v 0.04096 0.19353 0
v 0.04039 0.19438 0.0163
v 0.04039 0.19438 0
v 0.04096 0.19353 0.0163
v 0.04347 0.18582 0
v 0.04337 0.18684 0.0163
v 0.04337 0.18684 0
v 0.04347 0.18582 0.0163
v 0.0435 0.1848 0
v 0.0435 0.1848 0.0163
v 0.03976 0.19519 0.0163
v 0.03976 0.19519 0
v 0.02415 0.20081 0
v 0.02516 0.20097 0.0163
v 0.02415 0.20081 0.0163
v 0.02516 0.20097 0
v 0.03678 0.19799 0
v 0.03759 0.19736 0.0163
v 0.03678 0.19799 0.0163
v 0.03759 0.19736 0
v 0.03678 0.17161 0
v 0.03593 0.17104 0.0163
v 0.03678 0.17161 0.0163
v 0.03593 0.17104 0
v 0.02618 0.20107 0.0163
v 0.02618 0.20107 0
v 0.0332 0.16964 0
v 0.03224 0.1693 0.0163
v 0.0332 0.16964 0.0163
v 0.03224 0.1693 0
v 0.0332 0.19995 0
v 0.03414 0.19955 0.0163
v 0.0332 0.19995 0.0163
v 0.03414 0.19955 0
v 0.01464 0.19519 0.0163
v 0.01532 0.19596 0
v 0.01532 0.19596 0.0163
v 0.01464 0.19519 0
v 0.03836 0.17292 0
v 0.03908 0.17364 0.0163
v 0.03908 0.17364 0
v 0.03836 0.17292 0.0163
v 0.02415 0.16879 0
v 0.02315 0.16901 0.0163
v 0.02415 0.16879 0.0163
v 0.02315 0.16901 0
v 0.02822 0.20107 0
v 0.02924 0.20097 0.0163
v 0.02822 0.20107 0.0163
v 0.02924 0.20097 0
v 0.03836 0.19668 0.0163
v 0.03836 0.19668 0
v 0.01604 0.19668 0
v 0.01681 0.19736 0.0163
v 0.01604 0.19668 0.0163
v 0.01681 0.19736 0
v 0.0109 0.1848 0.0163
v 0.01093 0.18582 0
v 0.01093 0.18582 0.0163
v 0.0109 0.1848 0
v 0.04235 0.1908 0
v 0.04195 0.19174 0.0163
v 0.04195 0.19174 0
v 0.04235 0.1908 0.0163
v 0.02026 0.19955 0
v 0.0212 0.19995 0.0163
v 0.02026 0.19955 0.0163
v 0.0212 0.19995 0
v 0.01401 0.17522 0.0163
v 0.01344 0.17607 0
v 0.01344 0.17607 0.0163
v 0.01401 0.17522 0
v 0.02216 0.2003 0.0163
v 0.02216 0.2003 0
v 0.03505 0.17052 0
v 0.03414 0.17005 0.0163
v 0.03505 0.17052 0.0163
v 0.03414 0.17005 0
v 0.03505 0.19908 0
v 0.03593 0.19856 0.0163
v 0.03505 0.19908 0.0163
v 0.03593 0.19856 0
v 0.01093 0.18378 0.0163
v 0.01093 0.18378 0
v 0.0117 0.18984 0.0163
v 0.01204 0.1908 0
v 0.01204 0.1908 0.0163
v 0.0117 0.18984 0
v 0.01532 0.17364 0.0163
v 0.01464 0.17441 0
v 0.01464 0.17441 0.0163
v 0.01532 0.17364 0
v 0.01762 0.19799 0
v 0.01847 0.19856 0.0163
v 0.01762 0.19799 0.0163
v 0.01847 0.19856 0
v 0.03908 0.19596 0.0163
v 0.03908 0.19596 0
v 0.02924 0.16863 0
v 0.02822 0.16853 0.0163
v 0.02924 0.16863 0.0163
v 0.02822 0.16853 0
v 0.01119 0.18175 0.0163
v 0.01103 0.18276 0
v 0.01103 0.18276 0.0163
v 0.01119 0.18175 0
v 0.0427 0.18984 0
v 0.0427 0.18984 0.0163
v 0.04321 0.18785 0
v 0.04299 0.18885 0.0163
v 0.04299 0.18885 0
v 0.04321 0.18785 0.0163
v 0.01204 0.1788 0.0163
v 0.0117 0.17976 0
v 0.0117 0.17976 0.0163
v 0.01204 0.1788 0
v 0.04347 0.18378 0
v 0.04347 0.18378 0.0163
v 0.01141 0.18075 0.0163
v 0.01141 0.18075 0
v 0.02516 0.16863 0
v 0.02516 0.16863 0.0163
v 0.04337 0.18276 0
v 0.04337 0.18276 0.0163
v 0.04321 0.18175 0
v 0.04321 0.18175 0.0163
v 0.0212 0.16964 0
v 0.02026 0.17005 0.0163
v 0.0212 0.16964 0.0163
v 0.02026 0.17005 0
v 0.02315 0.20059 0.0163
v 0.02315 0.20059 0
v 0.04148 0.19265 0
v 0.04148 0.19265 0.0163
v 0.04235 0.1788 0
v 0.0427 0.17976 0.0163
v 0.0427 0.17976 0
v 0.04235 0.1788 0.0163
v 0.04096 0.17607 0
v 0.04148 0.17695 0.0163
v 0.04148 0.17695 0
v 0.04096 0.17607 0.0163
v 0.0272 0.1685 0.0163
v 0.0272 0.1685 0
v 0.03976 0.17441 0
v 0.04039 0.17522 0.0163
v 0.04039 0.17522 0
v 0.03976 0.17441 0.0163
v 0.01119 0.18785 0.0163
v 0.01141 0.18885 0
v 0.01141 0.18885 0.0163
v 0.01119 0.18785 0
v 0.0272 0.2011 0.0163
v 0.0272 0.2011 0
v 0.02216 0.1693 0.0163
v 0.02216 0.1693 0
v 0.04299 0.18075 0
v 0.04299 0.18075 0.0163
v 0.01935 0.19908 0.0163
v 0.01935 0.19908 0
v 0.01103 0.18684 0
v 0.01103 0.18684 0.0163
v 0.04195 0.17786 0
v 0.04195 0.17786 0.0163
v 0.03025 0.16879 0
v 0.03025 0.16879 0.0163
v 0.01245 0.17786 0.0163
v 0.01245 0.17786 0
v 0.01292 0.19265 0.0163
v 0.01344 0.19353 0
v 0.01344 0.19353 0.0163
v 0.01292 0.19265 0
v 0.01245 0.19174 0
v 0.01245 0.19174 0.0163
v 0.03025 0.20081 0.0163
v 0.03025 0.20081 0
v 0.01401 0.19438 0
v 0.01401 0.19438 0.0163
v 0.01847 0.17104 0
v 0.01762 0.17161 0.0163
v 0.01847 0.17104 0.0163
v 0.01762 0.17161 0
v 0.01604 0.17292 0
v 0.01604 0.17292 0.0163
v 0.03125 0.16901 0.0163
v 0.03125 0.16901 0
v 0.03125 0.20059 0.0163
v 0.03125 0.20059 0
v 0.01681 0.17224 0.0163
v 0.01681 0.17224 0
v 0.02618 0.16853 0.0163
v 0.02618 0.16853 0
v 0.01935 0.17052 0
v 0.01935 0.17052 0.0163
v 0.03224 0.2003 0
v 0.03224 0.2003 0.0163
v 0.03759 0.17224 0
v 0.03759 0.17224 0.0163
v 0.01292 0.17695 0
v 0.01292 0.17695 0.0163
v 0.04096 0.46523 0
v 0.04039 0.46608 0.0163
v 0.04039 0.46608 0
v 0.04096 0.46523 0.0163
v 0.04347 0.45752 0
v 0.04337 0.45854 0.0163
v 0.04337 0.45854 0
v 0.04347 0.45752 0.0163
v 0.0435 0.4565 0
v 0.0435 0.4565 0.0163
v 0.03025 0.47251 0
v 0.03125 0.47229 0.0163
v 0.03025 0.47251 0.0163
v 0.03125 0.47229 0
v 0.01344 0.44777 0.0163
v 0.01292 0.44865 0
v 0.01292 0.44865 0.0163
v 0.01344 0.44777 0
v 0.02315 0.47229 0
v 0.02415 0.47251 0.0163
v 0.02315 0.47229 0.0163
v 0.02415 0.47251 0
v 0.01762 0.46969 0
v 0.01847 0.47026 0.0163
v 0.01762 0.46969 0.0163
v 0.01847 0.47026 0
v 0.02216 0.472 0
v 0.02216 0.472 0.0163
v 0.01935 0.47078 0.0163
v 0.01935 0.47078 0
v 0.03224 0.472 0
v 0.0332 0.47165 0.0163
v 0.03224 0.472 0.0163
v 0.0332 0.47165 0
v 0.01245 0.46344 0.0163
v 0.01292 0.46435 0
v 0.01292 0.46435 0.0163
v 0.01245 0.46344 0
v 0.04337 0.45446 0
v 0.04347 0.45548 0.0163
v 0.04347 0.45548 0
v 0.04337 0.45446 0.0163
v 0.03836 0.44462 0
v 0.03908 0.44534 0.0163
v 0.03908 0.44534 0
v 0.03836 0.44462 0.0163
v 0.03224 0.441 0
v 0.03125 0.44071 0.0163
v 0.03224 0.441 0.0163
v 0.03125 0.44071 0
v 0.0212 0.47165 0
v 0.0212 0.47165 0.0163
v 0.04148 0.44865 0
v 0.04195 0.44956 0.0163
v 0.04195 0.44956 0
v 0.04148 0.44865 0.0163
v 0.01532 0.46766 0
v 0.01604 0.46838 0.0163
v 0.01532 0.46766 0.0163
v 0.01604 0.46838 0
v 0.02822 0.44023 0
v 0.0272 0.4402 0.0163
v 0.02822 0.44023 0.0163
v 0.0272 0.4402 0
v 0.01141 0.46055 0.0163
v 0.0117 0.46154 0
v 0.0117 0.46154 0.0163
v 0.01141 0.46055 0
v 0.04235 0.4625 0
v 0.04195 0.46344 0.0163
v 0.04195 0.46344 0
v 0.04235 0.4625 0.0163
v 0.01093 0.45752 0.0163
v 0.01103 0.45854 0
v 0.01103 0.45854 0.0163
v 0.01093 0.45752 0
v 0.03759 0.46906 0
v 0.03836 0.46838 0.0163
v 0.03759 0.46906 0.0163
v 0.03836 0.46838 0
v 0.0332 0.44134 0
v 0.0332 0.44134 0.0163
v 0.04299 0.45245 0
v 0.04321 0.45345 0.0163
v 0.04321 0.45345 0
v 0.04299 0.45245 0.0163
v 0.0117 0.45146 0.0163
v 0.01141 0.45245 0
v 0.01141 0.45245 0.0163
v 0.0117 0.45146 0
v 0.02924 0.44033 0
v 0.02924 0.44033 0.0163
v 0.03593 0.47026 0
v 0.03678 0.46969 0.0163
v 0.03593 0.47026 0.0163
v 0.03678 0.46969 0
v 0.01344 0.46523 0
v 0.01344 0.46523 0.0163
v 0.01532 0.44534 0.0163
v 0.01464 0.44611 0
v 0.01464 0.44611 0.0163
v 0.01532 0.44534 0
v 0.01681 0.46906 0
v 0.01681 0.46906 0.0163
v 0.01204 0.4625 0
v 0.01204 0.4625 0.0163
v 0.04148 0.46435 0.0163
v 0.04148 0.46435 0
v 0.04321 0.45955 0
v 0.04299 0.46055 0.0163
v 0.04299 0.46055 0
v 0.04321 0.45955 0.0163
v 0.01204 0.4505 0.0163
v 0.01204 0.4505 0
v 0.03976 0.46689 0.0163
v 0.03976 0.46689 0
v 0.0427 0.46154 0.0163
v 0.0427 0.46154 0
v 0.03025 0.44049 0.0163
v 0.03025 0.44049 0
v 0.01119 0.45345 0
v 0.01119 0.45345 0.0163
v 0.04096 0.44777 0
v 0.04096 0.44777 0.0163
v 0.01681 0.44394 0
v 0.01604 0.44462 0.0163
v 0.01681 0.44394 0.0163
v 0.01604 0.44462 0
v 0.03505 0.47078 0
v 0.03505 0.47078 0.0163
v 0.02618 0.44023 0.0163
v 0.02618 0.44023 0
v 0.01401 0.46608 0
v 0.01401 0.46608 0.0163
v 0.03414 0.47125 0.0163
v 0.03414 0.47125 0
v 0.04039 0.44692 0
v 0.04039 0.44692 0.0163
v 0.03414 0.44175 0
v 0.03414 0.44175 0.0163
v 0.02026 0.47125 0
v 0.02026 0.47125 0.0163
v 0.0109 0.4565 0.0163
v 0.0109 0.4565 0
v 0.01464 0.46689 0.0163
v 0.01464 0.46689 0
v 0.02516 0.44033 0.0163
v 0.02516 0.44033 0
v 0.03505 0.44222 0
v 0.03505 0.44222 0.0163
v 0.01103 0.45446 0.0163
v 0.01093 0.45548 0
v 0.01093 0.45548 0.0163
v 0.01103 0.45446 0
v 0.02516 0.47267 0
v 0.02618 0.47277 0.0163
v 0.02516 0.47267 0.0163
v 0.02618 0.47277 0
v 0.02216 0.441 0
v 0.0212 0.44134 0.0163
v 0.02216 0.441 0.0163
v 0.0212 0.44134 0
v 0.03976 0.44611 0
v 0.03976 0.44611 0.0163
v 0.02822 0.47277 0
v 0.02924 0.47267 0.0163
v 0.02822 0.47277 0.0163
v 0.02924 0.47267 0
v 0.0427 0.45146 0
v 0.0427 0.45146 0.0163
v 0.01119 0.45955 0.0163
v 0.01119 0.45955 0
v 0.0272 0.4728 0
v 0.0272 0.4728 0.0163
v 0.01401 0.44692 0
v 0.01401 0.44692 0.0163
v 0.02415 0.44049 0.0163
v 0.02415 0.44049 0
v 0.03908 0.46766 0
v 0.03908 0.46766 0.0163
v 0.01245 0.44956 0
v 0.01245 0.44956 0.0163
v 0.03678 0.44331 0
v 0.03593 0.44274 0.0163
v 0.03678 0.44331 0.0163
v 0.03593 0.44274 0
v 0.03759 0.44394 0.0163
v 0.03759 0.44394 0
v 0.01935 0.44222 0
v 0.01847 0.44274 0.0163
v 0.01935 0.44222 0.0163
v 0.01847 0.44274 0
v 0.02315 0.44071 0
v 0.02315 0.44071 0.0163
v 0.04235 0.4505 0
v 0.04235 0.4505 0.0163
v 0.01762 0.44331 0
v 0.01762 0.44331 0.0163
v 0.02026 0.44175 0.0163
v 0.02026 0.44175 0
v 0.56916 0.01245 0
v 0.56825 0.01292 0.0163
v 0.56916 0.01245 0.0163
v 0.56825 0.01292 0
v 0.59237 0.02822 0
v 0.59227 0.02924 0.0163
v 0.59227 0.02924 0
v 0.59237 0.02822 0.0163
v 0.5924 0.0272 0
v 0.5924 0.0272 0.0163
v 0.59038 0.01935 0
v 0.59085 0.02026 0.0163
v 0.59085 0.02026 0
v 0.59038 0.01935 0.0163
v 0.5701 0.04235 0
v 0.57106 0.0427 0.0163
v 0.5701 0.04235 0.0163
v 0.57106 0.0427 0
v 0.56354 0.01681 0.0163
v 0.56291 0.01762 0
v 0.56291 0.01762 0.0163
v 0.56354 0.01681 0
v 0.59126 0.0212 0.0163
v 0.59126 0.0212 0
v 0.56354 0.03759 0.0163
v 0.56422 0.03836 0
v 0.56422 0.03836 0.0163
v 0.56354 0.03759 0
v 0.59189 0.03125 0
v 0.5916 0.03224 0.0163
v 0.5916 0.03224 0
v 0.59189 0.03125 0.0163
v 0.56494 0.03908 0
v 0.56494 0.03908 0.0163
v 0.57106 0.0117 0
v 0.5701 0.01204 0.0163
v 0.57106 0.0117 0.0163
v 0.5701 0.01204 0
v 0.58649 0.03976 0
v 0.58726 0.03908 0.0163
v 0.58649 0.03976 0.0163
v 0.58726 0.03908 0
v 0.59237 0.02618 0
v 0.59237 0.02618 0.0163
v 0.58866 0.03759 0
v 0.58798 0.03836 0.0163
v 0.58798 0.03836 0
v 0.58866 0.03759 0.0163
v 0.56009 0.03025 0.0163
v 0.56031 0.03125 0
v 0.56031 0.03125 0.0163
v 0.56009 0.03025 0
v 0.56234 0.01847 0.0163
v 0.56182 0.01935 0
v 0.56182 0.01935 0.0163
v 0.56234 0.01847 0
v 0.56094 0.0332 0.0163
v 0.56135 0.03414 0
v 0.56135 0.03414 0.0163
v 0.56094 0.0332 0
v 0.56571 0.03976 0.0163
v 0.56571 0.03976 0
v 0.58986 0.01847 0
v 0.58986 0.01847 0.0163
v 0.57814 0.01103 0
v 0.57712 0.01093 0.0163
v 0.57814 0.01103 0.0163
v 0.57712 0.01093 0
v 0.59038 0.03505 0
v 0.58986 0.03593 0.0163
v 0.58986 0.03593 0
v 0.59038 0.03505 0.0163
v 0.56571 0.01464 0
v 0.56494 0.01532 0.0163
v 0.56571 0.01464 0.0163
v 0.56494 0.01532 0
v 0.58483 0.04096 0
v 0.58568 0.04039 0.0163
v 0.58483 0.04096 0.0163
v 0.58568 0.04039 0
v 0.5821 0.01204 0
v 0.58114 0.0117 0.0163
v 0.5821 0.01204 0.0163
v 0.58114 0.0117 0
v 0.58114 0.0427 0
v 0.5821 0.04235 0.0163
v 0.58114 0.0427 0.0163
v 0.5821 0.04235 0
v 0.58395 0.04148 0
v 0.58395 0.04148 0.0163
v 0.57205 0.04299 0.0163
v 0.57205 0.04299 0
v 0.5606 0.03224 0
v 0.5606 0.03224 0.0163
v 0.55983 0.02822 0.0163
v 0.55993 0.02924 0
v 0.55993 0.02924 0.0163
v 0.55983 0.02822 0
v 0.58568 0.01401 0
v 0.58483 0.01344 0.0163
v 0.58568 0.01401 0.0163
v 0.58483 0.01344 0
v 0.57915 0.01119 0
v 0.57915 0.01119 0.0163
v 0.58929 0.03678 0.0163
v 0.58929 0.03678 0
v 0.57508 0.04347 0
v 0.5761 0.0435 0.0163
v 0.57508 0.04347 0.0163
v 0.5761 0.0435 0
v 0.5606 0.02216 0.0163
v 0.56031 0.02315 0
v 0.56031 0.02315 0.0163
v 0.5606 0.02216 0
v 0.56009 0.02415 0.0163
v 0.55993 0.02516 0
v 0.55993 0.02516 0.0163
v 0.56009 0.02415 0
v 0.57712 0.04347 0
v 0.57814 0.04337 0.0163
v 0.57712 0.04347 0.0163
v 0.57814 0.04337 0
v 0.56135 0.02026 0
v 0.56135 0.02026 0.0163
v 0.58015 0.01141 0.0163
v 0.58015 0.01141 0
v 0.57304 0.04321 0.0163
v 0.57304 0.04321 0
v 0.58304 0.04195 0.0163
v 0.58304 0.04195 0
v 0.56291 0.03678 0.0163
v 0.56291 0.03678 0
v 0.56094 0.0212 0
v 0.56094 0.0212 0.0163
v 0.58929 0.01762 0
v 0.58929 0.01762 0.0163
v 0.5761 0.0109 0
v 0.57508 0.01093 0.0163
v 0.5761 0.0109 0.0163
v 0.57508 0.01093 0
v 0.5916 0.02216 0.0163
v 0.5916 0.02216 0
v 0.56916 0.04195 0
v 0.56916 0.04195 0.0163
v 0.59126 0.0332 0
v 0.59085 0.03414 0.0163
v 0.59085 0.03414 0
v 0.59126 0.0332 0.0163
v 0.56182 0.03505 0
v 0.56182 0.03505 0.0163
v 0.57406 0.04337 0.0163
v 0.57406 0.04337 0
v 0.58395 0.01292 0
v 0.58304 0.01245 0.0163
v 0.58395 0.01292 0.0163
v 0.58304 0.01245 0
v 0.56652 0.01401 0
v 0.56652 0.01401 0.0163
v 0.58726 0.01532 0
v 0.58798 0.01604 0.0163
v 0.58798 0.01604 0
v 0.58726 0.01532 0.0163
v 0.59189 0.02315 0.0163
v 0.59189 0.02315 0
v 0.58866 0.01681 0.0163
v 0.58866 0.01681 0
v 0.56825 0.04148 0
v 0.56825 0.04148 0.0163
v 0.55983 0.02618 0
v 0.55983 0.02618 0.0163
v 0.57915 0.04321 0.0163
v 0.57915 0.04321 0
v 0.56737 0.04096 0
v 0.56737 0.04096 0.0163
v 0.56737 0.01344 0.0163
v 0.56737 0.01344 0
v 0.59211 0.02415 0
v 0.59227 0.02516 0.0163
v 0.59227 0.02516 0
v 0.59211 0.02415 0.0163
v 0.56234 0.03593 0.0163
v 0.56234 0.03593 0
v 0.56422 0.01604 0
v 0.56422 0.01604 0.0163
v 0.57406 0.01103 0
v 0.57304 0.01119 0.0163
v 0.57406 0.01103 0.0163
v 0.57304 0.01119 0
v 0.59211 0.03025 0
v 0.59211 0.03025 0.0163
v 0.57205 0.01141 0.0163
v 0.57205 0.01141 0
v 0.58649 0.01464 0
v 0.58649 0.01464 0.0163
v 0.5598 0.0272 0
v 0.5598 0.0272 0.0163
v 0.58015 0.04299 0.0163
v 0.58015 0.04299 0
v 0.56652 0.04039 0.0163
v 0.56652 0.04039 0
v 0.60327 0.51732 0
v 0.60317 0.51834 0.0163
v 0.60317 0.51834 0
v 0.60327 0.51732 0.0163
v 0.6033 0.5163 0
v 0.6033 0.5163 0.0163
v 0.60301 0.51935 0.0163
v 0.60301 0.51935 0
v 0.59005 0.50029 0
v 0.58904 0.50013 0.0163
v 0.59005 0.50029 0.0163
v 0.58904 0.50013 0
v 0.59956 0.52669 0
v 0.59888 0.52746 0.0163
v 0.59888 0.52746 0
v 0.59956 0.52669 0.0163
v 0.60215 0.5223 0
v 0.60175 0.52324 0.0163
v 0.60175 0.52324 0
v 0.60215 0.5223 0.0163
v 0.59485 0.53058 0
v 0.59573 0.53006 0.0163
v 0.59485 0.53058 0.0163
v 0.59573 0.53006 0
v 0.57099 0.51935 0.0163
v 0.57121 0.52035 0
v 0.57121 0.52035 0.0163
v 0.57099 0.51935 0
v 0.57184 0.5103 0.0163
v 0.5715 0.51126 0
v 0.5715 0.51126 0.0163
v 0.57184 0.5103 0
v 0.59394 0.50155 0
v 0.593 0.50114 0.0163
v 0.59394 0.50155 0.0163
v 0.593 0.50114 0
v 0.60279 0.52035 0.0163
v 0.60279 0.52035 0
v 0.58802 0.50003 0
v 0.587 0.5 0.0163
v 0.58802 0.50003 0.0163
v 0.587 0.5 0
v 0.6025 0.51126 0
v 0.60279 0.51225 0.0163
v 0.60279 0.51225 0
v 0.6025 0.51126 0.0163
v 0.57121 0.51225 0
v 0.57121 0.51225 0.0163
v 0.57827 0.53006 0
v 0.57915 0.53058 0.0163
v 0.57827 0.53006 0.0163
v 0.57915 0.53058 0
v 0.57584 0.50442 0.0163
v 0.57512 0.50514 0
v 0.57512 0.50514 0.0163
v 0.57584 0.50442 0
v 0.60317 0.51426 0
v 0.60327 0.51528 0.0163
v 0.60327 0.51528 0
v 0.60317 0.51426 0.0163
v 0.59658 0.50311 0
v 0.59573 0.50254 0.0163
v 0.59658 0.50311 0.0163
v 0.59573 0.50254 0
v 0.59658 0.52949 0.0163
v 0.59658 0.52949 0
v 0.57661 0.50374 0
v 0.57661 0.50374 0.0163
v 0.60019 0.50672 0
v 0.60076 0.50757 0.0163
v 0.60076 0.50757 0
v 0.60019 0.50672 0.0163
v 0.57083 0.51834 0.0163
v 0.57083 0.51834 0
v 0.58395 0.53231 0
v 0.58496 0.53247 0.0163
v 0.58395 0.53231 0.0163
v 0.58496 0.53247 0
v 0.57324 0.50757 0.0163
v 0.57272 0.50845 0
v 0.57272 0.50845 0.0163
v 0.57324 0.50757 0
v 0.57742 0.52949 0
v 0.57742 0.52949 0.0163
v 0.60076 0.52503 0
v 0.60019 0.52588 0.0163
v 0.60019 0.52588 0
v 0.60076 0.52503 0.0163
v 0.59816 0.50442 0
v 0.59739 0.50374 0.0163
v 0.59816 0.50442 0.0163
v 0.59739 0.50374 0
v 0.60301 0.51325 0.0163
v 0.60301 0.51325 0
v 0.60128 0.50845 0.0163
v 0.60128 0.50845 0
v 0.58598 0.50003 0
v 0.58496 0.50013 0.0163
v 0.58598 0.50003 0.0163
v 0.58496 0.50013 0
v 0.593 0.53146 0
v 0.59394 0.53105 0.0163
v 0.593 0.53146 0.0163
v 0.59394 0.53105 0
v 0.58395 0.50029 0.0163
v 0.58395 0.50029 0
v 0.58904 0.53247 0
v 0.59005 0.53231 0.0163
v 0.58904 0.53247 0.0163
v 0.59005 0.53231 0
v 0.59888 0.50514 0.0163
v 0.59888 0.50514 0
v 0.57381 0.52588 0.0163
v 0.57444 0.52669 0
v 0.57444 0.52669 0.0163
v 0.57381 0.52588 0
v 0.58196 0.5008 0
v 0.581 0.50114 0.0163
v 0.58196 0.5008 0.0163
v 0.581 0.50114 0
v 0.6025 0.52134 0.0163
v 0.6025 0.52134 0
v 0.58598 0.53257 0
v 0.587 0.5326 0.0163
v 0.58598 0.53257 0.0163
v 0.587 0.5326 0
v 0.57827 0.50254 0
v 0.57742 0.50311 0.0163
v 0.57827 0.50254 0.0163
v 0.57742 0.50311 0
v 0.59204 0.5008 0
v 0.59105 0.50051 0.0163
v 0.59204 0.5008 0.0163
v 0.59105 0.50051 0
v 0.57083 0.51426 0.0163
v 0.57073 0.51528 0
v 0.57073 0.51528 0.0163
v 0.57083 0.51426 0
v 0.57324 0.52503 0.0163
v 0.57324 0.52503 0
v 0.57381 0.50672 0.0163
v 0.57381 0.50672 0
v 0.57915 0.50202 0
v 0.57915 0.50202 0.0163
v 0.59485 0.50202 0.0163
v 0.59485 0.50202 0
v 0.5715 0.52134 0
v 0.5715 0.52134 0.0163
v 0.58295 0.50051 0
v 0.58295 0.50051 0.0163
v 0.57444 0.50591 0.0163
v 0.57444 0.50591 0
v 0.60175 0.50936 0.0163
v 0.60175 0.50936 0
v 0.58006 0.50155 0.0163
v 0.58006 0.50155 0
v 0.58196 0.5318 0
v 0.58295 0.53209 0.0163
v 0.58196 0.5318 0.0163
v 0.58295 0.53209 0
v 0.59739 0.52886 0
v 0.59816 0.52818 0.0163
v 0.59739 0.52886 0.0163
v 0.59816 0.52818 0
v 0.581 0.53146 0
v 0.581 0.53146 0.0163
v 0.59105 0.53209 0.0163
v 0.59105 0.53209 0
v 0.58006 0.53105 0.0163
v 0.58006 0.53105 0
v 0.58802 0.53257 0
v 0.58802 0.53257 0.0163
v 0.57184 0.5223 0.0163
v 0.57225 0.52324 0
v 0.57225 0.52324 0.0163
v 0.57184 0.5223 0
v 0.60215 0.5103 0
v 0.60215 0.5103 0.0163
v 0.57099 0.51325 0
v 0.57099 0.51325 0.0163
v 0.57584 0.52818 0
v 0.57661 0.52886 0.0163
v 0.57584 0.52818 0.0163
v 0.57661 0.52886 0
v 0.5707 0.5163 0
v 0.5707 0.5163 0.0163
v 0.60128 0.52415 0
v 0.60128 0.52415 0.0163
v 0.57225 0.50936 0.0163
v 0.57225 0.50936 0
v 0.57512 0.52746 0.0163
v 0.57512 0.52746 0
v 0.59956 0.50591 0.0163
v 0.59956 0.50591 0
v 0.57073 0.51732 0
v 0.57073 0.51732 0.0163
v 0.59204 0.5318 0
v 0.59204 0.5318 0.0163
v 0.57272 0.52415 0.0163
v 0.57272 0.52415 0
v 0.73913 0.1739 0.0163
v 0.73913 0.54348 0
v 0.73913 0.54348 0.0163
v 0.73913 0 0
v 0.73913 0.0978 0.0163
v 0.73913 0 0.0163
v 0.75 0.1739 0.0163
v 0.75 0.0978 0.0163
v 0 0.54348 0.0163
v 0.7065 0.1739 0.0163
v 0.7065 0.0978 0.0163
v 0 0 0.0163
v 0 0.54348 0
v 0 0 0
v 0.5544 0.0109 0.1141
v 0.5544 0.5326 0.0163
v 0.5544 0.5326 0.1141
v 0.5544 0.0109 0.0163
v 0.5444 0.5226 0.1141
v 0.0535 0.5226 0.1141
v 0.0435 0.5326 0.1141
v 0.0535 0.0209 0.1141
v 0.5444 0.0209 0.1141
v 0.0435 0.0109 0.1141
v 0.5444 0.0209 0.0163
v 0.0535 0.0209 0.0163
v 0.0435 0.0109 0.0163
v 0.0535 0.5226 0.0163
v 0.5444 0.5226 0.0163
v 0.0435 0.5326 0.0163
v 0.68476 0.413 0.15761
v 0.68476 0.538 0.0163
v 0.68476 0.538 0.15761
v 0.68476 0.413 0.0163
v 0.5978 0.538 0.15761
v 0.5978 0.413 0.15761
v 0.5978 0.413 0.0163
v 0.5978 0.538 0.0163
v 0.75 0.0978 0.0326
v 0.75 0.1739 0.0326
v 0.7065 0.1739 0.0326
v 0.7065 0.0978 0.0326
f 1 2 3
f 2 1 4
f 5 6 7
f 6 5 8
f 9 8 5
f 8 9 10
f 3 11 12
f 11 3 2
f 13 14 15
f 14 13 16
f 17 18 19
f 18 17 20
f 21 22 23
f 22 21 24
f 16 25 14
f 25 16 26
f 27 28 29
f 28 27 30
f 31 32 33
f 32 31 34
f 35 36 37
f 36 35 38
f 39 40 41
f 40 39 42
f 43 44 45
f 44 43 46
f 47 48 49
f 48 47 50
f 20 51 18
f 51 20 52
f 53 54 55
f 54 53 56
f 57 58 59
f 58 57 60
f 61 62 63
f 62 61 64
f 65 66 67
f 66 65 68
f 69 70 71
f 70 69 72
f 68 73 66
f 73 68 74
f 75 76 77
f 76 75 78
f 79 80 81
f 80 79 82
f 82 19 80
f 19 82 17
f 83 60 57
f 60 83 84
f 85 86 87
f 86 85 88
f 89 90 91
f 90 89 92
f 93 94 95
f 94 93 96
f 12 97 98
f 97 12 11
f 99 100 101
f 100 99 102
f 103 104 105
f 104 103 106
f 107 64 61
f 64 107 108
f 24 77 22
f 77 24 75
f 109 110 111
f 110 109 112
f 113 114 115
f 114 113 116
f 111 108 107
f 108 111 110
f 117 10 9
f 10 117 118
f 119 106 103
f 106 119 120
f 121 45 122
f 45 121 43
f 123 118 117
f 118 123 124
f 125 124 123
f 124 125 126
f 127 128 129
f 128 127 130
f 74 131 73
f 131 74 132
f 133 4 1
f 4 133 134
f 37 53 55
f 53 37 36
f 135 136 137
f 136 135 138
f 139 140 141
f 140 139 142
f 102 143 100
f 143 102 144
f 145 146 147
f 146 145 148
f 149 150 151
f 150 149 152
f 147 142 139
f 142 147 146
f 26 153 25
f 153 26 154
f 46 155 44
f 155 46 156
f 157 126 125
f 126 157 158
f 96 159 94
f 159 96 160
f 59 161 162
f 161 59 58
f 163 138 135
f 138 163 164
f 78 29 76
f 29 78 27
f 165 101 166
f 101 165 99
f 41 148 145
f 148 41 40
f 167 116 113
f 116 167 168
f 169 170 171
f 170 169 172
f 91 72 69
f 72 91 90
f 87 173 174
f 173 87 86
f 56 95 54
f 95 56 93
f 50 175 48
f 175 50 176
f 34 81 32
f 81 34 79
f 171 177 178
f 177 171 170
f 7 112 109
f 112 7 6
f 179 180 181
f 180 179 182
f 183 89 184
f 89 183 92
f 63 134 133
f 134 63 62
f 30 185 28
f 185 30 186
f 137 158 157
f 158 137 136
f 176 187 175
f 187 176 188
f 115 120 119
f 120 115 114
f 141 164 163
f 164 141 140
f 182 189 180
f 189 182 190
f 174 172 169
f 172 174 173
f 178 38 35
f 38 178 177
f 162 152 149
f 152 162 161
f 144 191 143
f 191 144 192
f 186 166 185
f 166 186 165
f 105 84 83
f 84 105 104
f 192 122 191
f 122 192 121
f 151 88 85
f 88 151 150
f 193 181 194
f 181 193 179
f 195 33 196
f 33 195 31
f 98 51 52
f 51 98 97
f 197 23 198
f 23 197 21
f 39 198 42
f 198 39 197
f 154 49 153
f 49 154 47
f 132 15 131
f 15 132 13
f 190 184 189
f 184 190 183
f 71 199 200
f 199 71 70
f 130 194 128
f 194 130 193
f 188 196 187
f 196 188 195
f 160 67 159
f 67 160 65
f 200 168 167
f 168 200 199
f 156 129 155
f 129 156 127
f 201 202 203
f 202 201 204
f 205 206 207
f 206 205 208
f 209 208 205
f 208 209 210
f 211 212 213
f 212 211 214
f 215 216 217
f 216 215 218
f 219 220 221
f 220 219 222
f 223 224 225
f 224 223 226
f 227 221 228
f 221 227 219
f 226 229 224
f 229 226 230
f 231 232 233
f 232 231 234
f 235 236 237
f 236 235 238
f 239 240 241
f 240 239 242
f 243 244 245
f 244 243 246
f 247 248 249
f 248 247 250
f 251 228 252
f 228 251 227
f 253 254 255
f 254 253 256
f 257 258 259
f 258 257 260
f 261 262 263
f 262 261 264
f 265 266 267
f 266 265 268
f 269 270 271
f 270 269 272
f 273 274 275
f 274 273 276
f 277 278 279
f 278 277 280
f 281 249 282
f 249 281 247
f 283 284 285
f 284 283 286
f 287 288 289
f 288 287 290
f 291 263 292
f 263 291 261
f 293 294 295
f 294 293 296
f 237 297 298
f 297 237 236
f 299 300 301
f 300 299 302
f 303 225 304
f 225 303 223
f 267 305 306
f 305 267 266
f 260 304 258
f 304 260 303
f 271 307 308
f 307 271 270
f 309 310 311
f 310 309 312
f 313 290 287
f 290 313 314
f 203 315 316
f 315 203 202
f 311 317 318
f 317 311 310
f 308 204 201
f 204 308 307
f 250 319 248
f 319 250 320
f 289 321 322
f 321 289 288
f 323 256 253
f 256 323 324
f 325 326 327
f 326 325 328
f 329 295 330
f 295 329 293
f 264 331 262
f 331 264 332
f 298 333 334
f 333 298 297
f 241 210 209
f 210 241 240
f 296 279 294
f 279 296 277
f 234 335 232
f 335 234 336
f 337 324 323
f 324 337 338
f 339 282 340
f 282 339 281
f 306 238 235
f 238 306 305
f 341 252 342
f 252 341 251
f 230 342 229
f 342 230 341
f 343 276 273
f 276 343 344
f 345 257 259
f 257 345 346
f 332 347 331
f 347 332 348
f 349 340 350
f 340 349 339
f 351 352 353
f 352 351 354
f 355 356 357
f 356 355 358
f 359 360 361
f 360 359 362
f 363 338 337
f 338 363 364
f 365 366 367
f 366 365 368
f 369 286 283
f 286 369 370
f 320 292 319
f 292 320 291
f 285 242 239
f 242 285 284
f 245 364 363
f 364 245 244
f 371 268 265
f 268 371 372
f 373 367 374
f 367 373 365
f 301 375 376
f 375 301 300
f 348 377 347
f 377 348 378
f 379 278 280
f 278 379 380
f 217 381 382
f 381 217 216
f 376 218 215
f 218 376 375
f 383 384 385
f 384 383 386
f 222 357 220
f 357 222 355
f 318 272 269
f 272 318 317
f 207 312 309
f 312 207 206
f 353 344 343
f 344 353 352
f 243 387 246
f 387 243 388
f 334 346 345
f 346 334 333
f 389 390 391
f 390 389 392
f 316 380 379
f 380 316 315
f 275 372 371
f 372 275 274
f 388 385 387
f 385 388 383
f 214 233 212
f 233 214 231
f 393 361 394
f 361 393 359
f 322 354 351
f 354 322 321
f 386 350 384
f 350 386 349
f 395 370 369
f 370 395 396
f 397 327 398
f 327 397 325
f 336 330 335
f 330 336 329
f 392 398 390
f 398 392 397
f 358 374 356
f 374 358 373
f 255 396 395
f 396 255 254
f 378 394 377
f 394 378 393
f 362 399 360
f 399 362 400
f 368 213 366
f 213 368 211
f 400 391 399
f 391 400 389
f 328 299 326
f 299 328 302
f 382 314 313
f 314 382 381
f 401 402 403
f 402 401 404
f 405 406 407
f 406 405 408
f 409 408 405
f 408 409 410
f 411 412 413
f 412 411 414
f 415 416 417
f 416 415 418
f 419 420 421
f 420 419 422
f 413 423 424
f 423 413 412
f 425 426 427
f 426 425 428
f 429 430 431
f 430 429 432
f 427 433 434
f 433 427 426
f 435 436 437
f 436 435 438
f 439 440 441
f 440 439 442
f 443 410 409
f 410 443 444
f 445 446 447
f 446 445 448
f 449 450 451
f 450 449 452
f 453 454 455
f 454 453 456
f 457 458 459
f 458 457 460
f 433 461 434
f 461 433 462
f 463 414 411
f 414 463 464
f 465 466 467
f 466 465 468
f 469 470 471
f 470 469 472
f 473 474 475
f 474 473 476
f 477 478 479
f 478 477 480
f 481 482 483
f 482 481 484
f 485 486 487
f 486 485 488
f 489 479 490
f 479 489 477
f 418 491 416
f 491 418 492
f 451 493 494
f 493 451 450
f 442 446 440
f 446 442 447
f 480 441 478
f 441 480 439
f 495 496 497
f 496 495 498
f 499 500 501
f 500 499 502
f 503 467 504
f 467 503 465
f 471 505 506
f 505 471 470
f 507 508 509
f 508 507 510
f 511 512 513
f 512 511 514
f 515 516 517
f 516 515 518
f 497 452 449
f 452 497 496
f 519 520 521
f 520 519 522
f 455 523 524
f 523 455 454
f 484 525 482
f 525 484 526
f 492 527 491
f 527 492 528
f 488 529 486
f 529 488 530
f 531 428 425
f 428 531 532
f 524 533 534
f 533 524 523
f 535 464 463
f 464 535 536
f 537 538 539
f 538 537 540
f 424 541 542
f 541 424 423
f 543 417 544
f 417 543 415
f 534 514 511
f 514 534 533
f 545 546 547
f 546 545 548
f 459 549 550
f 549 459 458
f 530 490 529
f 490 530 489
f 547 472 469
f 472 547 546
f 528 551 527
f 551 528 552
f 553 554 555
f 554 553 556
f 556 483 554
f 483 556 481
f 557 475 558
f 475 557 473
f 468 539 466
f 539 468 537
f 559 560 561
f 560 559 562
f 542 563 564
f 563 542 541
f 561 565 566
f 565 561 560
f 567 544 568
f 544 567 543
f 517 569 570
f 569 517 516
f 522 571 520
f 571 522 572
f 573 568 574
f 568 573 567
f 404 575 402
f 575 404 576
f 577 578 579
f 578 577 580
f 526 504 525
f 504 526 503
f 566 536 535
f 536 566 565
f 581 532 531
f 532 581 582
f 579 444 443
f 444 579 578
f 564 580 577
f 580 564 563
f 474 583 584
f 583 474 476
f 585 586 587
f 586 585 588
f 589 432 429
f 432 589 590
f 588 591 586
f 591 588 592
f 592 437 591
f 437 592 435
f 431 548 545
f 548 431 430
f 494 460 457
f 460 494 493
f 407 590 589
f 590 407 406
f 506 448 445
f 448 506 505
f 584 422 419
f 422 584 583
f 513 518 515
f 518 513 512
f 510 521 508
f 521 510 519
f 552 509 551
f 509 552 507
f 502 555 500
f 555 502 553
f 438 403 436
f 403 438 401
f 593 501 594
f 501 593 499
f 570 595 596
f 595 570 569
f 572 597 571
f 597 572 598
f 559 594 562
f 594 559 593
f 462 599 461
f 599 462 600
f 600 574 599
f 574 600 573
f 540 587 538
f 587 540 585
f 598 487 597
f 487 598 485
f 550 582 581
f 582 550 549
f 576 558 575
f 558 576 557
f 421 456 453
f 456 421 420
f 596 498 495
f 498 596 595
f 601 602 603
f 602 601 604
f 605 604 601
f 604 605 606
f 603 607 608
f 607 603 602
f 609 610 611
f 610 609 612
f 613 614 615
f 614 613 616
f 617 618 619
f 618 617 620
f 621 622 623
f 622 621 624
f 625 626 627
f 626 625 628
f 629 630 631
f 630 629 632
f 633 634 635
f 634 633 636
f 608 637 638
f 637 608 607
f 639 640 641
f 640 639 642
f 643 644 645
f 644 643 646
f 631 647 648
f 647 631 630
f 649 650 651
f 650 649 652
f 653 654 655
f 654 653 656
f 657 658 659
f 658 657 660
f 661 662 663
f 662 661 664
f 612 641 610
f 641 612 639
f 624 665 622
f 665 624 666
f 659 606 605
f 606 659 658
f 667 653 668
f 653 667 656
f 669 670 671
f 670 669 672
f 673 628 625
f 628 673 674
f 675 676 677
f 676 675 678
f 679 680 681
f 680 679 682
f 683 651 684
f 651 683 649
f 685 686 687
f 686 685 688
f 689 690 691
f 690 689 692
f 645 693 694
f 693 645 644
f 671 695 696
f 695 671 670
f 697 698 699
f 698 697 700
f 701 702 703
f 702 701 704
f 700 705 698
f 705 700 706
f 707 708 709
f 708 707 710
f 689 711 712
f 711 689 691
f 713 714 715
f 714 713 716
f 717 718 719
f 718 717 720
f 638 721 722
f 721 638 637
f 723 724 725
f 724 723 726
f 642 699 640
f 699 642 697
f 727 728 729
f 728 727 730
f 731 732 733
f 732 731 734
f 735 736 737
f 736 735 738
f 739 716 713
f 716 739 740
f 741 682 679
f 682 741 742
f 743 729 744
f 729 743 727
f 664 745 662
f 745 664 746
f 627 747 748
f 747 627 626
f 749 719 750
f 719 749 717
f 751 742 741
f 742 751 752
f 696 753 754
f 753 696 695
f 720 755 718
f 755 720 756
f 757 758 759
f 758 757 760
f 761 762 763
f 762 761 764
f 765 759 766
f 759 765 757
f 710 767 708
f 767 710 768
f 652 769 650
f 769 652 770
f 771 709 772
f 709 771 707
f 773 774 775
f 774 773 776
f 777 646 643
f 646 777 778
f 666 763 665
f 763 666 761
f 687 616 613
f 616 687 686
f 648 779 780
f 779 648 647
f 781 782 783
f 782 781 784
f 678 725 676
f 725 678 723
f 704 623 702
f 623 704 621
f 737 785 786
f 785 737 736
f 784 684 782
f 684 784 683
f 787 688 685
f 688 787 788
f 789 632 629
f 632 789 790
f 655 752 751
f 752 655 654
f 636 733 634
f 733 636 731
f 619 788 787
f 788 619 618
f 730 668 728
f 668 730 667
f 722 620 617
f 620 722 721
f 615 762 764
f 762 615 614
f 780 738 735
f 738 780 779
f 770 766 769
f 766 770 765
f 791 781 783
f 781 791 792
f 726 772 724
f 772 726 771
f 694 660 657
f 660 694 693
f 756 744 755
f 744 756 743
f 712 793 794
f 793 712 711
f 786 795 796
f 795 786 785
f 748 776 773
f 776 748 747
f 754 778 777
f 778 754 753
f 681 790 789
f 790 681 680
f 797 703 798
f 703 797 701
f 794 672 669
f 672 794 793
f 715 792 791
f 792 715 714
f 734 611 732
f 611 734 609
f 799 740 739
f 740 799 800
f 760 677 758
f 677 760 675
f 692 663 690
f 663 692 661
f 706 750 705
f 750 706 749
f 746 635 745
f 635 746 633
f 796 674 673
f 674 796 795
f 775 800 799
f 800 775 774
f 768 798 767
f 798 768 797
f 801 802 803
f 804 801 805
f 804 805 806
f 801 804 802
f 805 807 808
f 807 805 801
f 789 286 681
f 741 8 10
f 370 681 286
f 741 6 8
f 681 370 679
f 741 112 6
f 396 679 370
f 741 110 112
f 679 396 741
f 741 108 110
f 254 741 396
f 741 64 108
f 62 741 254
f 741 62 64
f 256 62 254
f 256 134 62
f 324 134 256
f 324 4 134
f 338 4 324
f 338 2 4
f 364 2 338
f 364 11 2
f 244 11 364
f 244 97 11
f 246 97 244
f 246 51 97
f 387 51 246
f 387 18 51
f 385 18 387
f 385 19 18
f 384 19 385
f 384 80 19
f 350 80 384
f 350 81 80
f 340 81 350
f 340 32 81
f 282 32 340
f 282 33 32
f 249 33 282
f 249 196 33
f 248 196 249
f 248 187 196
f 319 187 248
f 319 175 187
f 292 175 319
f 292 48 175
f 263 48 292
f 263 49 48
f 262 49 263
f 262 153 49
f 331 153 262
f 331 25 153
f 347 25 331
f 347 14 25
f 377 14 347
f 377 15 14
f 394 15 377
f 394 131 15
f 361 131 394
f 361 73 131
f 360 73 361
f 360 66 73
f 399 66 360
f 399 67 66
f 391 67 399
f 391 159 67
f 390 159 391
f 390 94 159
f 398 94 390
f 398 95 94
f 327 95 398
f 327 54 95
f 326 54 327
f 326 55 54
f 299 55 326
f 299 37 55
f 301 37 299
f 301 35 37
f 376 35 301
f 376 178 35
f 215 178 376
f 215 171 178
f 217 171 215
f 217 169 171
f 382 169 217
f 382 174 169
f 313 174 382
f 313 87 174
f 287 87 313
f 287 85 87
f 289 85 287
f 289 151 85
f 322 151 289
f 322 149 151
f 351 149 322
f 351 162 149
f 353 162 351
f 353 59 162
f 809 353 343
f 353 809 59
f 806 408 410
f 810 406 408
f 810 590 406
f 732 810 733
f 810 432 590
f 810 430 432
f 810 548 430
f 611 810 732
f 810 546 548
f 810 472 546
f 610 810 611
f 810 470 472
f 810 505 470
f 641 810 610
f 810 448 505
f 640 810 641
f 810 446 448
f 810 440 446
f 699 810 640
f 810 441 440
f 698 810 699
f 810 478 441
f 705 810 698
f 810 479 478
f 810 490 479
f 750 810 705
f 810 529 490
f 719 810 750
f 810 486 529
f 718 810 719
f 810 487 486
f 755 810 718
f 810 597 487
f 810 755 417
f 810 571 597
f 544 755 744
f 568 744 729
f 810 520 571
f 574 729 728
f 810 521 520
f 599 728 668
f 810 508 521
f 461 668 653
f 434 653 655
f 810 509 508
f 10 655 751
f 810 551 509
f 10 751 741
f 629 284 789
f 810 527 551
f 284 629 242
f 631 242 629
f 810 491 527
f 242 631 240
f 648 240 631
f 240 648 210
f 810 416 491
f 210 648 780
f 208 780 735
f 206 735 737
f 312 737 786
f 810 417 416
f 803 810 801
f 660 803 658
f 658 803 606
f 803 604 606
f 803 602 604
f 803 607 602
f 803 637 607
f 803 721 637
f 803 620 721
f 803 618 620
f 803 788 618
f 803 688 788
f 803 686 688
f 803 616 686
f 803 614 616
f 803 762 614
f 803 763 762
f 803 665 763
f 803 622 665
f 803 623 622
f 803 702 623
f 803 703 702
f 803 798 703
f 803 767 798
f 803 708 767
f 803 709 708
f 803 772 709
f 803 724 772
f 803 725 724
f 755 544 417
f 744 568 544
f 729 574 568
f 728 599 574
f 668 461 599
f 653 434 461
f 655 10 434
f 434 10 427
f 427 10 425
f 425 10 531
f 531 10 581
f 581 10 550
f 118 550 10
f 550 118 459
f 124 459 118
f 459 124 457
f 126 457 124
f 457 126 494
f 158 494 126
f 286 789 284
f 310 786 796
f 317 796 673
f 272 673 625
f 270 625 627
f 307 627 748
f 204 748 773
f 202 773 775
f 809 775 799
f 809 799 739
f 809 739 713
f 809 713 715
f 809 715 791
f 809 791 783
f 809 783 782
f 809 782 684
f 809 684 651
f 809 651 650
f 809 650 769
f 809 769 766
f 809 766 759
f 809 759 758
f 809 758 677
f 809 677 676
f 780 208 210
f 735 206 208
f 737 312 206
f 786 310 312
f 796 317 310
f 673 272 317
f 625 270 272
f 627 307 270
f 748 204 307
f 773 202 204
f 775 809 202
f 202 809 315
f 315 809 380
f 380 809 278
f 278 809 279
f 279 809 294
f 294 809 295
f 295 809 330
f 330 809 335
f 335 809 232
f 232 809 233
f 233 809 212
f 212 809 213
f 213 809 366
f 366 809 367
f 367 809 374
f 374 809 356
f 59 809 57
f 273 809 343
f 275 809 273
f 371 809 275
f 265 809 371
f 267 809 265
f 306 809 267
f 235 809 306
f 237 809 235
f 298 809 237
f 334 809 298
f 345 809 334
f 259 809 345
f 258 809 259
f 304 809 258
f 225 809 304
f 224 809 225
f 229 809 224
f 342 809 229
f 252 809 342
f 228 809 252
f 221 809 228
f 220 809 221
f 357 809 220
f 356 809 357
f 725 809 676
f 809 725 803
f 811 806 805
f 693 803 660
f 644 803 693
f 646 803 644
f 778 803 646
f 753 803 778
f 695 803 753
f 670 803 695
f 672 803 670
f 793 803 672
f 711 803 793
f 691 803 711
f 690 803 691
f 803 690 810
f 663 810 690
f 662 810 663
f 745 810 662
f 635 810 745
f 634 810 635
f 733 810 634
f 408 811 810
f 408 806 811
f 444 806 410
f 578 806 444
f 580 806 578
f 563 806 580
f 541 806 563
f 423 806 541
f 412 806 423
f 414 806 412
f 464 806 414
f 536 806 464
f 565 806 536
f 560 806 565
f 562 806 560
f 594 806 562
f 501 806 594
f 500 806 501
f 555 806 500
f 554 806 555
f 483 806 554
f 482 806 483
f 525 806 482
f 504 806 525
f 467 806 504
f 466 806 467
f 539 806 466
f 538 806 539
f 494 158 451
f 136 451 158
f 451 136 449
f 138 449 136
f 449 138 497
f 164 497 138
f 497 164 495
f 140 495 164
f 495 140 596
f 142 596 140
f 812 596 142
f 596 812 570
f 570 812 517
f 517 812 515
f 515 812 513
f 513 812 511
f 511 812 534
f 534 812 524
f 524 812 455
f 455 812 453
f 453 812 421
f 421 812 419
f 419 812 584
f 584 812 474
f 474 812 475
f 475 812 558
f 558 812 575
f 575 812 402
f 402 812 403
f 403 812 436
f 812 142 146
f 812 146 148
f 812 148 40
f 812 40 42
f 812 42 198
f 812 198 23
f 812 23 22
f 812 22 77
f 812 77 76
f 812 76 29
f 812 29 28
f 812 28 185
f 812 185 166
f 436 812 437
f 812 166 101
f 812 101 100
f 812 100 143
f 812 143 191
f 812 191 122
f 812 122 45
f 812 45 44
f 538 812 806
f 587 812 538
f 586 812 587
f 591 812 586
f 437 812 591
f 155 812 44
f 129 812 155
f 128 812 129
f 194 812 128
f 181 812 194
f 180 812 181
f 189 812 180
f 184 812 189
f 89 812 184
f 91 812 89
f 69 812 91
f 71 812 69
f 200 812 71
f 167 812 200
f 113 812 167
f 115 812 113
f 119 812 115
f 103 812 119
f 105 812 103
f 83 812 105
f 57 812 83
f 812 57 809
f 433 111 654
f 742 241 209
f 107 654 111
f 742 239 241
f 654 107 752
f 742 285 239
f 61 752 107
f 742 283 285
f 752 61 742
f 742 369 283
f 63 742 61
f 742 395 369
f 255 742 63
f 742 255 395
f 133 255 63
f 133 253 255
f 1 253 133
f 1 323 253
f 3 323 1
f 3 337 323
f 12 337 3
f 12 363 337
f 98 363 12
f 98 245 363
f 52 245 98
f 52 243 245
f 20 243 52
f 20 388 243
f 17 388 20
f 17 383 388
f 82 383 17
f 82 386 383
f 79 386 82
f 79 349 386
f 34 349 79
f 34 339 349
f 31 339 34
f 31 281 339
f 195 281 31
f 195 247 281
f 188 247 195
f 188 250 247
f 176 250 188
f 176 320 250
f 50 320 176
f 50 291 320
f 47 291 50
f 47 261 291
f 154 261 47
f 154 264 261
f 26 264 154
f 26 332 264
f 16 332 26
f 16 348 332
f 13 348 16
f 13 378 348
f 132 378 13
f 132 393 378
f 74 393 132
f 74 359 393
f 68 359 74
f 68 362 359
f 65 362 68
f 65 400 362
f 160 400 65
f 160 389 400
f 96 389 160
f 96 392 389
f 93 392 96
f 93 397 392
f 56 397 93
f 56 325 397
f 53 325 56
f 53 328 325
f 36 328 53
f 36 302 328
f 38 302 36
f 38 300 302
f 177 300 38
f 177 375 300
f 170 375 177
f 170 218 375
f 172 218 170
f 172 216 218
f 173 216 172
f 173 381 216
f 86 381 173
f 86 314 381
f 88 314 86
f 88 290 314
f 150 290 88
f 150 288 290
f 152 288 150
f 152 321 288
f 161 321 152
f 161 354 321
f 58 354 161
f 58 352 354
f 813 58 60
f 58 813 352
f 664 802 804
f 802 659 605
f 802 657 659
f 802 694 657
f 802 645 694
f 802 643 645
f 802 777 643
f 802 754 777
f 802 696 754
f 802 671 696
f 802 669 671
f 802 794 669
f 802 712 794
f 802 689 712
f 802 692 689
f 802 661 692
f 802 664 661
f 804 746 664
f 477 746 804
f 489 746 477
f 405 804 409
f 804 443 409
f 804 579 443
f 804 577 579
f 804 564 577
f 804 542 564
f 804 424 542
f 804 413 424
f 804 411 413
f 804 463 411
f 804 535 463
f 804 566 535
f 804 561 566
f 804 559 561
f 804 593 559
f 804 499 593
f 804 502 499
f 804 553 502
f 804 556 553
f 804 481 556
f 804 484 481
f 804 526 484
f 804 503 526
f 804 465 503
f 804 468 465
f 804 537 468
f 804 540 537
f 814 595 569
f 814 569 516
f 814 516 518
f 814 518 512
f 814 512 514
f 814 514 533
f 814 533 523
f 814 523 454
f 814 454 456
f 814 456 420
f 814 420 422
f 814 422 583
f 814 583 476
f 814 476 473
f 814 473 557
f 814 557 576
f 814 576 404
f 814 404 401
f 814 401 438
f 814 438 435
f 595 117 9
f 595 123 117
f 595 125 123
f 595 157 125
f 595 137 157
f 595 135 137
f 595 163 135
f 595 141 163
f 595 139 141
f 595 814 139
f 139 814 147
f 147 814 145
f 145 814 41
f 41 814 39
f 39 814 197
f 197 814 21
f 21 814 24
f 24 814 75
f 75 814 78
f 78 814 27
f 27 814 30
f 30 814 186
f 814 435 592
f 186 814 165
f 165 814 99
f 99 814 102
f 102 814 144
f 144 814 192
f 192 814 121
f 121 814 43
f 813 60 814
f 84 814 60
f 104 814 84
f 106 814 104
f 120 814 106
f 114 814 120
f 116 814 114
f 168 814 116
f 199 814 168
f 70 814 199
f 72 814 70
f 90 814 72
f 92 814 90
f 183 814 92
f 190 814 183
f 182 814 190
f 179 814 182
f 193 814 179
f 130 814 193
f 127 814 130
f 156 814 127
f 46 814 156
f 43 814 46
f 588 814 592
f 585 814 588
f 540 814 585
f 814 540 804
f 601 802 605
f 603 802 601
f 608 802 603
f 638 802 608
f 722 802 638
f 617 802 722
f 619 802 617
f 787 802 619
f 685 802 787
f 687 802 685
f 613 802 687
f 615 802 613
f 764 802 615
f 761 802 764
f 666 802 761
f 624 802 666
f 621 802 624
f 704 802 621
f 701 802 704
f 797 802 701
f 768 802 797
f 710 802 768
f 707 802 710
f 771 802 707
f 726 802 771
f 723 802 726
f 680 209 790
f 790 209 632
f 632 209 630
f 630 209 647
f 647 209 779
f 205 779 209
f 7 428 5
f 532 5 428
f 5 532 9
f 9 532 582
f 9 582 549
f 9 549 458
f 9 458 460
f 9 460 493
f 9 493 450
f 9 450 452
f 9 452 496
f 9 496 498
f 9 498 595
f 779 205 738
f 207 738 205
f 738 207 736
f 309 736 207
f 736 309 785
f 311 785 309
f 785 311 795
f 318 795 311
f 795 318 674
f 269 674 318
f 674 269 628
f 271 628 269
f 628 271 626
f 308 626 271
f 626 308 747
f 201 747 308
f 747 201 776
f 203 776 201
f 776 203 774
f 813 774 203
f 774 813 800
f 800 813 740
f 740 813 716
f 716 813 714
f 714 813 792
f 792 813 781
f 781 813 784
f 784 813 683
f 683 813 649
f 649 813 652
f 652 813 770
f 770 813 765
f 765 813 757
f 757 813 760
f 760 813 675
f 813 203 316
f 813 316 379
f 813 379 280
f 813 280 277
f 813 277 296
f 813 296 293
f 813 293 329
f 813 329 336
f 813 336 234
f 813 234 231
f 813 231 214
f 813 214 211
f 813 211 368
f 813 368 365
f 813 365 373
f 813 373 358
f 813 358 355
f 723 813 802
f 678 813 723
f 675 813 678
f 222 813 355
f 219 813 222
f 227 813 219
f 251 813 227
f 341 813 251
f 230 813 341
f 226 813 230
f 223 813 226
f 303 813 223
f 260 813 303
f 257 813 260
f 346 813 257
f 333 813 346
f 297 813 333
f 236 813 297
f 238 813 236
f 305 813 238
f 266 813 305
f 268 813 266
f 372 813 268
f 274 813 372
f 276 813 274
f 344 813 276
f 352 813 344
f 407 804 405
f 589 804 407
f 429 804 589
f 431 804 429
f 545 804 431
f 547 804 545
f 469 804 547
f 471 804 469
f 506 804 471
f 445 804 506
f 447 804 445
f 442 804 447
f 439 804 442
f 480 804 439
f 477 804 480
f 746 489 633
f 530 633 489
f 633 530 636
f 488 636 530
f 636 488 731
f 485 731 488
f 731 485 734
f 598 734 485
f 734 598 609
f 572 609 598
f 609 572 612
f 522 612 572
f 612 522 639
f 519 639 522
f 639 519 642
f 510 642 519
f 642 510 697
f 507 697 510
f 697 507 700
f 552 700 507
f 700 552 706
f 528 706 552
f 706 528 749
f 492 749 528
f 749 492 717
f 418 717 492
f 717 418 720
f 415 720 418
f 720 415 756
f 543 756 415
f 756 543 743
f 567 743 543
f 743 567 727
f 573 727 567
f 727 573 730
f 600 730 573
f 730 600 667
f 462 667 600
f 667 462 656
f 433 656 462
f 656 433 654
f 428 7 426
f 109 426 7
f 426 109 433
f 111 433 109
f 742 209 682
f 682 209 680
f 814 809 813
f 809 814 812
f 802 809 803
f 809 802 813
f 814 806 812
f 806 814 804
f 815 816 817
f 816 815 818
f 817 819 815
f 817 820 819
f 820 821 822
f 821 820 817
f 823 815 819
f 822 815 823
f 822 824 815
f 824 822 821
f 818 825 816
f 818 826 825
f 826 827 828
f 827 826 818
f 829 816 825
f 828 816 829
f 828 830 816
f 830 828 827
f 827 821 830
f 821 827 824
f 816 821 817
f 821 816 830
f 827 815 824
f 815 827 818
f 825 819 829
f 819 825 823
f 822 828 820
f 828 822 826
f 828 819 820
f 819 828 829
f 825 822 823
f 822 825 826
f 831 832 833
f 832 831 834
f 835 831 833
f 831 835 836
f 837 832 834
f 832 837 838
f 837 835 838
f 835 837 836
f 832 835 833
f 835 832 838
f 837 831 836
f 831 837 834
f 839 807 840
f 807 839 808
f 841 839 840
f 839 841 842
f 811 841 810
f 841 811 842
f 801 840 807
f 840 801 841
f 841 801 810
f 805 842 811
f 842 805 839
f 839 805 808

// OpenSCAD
// Parameters for base plate
base_length = 0.73913;
base_width = 0.543478;
base_height = 0.016304;
hole_radius = 0.0163;

// Hole positions (from left/front edges)
hole1 = [0.0272, 0.1848];
hole2 = [0.0272, 0.4565];
hole3 = [0.5761, 0.0272];
hole4 = [0.587, 0.5163];

// Raised rail group parameters
rail_span_x = 0.5109;
rail_span_y = 0.5217;
rail_offset_left = 0.0435;
rail_offset_right = 0.1847;
rail_offset_front = 0.0109;
rail_offset_back = 0.0109;
rail_height = 0.0978;
wall_thickness = 0.01; // Assumed wall thickness for frame

// Shallow tab parameters
tab_width = 0.0435;
tab_depth = 0.0761;
tab_offset_left = 0.7065;
tab_offset_right = -0.0109;
tab_offset_front = 0.0978;
tab_offset_back = 0.3696;
tab_height = 0.0163;

// Deeper block parameters
block_length = 0.086957;
block_width = 0.125;
block_height = 0.141304;
block_offset_left = 0.5978;
block_offset_right = 0;
block_offset_front = 0.413;
block_offset_back = 0.0435;
block_hole_radius = 0.0326;
block_hole_center = [0.7391, 0.4548];

$fn = 100; // Smooth curves

// Base plate with through holes
module base_plate() {
    difference() {
        cube([base_length, base_width, base_height]);
        // Four circular through holes
        for (pos = [hole1, hole2, hole3, hole4]) {
            translate([pos[0], pos[1], -0.001])
                cylinder(h = base_height + 0.002, r = hole_radius);
        }
    }
}

// Raised rail group as rectangular frame
module raised_rails() {
    // Outer rectangle position
    outer_x = rail_offset_left;
    outer_y = rail_offset_front;
    // Inner rectangle dimensions
    inner_x = outer_x + wall_thickness;
    inner_y = outer_y + wall_thickness;
    inner_width = rail_span_x - 2 * wall_thickness;
    inner_depth = rail_span_y - 2 * wall_thickness;
    
    translate([0, 0, base_height]) {
        difference() {
            // Outer solid rectangle
            translate([outer_x, outer_y, 0])
                cube([rail_span_x, rail_span_y, rail_height]);
            // Inner cutout to create frame
            translate([inner_x, inner_y, -0.001])
                cube([inner_width, inner_depth, rail_height + 0.002]);
        }
    }
}

// Shallow rectangular tab
module shallow_tab() {
    // Calculate actual position from offsets
    tab_x = tab_offset_left;
    tab_y = tab_offset_front;
    translate([tab_x, tab_y, base_height])
        cube([tab_width, tab_depth, tab_height]);
}

// Deeper side block with circular hole
module deeper_block() {
    // Calculate actual position from offsets
    block_x = block_offset_left;
    block_y = block_offset_front;
    
    translate([0, 0, base_height]) {
        difference() {
            // Main block
            translate([block_x, block_y, 0])
                cube([block_length, block_width, block_height]);
            // Circular through hole
            translate([block_hole_center[0], block_hole_center[1], -0.001])
                cylinder(h = block_height + 0.002, r = block_hole_radius);
        }
    }
}

// Main assembly
union() {
    base_plate();
    raised_rails();
    shallow_tab();
    deeper_block();
}
